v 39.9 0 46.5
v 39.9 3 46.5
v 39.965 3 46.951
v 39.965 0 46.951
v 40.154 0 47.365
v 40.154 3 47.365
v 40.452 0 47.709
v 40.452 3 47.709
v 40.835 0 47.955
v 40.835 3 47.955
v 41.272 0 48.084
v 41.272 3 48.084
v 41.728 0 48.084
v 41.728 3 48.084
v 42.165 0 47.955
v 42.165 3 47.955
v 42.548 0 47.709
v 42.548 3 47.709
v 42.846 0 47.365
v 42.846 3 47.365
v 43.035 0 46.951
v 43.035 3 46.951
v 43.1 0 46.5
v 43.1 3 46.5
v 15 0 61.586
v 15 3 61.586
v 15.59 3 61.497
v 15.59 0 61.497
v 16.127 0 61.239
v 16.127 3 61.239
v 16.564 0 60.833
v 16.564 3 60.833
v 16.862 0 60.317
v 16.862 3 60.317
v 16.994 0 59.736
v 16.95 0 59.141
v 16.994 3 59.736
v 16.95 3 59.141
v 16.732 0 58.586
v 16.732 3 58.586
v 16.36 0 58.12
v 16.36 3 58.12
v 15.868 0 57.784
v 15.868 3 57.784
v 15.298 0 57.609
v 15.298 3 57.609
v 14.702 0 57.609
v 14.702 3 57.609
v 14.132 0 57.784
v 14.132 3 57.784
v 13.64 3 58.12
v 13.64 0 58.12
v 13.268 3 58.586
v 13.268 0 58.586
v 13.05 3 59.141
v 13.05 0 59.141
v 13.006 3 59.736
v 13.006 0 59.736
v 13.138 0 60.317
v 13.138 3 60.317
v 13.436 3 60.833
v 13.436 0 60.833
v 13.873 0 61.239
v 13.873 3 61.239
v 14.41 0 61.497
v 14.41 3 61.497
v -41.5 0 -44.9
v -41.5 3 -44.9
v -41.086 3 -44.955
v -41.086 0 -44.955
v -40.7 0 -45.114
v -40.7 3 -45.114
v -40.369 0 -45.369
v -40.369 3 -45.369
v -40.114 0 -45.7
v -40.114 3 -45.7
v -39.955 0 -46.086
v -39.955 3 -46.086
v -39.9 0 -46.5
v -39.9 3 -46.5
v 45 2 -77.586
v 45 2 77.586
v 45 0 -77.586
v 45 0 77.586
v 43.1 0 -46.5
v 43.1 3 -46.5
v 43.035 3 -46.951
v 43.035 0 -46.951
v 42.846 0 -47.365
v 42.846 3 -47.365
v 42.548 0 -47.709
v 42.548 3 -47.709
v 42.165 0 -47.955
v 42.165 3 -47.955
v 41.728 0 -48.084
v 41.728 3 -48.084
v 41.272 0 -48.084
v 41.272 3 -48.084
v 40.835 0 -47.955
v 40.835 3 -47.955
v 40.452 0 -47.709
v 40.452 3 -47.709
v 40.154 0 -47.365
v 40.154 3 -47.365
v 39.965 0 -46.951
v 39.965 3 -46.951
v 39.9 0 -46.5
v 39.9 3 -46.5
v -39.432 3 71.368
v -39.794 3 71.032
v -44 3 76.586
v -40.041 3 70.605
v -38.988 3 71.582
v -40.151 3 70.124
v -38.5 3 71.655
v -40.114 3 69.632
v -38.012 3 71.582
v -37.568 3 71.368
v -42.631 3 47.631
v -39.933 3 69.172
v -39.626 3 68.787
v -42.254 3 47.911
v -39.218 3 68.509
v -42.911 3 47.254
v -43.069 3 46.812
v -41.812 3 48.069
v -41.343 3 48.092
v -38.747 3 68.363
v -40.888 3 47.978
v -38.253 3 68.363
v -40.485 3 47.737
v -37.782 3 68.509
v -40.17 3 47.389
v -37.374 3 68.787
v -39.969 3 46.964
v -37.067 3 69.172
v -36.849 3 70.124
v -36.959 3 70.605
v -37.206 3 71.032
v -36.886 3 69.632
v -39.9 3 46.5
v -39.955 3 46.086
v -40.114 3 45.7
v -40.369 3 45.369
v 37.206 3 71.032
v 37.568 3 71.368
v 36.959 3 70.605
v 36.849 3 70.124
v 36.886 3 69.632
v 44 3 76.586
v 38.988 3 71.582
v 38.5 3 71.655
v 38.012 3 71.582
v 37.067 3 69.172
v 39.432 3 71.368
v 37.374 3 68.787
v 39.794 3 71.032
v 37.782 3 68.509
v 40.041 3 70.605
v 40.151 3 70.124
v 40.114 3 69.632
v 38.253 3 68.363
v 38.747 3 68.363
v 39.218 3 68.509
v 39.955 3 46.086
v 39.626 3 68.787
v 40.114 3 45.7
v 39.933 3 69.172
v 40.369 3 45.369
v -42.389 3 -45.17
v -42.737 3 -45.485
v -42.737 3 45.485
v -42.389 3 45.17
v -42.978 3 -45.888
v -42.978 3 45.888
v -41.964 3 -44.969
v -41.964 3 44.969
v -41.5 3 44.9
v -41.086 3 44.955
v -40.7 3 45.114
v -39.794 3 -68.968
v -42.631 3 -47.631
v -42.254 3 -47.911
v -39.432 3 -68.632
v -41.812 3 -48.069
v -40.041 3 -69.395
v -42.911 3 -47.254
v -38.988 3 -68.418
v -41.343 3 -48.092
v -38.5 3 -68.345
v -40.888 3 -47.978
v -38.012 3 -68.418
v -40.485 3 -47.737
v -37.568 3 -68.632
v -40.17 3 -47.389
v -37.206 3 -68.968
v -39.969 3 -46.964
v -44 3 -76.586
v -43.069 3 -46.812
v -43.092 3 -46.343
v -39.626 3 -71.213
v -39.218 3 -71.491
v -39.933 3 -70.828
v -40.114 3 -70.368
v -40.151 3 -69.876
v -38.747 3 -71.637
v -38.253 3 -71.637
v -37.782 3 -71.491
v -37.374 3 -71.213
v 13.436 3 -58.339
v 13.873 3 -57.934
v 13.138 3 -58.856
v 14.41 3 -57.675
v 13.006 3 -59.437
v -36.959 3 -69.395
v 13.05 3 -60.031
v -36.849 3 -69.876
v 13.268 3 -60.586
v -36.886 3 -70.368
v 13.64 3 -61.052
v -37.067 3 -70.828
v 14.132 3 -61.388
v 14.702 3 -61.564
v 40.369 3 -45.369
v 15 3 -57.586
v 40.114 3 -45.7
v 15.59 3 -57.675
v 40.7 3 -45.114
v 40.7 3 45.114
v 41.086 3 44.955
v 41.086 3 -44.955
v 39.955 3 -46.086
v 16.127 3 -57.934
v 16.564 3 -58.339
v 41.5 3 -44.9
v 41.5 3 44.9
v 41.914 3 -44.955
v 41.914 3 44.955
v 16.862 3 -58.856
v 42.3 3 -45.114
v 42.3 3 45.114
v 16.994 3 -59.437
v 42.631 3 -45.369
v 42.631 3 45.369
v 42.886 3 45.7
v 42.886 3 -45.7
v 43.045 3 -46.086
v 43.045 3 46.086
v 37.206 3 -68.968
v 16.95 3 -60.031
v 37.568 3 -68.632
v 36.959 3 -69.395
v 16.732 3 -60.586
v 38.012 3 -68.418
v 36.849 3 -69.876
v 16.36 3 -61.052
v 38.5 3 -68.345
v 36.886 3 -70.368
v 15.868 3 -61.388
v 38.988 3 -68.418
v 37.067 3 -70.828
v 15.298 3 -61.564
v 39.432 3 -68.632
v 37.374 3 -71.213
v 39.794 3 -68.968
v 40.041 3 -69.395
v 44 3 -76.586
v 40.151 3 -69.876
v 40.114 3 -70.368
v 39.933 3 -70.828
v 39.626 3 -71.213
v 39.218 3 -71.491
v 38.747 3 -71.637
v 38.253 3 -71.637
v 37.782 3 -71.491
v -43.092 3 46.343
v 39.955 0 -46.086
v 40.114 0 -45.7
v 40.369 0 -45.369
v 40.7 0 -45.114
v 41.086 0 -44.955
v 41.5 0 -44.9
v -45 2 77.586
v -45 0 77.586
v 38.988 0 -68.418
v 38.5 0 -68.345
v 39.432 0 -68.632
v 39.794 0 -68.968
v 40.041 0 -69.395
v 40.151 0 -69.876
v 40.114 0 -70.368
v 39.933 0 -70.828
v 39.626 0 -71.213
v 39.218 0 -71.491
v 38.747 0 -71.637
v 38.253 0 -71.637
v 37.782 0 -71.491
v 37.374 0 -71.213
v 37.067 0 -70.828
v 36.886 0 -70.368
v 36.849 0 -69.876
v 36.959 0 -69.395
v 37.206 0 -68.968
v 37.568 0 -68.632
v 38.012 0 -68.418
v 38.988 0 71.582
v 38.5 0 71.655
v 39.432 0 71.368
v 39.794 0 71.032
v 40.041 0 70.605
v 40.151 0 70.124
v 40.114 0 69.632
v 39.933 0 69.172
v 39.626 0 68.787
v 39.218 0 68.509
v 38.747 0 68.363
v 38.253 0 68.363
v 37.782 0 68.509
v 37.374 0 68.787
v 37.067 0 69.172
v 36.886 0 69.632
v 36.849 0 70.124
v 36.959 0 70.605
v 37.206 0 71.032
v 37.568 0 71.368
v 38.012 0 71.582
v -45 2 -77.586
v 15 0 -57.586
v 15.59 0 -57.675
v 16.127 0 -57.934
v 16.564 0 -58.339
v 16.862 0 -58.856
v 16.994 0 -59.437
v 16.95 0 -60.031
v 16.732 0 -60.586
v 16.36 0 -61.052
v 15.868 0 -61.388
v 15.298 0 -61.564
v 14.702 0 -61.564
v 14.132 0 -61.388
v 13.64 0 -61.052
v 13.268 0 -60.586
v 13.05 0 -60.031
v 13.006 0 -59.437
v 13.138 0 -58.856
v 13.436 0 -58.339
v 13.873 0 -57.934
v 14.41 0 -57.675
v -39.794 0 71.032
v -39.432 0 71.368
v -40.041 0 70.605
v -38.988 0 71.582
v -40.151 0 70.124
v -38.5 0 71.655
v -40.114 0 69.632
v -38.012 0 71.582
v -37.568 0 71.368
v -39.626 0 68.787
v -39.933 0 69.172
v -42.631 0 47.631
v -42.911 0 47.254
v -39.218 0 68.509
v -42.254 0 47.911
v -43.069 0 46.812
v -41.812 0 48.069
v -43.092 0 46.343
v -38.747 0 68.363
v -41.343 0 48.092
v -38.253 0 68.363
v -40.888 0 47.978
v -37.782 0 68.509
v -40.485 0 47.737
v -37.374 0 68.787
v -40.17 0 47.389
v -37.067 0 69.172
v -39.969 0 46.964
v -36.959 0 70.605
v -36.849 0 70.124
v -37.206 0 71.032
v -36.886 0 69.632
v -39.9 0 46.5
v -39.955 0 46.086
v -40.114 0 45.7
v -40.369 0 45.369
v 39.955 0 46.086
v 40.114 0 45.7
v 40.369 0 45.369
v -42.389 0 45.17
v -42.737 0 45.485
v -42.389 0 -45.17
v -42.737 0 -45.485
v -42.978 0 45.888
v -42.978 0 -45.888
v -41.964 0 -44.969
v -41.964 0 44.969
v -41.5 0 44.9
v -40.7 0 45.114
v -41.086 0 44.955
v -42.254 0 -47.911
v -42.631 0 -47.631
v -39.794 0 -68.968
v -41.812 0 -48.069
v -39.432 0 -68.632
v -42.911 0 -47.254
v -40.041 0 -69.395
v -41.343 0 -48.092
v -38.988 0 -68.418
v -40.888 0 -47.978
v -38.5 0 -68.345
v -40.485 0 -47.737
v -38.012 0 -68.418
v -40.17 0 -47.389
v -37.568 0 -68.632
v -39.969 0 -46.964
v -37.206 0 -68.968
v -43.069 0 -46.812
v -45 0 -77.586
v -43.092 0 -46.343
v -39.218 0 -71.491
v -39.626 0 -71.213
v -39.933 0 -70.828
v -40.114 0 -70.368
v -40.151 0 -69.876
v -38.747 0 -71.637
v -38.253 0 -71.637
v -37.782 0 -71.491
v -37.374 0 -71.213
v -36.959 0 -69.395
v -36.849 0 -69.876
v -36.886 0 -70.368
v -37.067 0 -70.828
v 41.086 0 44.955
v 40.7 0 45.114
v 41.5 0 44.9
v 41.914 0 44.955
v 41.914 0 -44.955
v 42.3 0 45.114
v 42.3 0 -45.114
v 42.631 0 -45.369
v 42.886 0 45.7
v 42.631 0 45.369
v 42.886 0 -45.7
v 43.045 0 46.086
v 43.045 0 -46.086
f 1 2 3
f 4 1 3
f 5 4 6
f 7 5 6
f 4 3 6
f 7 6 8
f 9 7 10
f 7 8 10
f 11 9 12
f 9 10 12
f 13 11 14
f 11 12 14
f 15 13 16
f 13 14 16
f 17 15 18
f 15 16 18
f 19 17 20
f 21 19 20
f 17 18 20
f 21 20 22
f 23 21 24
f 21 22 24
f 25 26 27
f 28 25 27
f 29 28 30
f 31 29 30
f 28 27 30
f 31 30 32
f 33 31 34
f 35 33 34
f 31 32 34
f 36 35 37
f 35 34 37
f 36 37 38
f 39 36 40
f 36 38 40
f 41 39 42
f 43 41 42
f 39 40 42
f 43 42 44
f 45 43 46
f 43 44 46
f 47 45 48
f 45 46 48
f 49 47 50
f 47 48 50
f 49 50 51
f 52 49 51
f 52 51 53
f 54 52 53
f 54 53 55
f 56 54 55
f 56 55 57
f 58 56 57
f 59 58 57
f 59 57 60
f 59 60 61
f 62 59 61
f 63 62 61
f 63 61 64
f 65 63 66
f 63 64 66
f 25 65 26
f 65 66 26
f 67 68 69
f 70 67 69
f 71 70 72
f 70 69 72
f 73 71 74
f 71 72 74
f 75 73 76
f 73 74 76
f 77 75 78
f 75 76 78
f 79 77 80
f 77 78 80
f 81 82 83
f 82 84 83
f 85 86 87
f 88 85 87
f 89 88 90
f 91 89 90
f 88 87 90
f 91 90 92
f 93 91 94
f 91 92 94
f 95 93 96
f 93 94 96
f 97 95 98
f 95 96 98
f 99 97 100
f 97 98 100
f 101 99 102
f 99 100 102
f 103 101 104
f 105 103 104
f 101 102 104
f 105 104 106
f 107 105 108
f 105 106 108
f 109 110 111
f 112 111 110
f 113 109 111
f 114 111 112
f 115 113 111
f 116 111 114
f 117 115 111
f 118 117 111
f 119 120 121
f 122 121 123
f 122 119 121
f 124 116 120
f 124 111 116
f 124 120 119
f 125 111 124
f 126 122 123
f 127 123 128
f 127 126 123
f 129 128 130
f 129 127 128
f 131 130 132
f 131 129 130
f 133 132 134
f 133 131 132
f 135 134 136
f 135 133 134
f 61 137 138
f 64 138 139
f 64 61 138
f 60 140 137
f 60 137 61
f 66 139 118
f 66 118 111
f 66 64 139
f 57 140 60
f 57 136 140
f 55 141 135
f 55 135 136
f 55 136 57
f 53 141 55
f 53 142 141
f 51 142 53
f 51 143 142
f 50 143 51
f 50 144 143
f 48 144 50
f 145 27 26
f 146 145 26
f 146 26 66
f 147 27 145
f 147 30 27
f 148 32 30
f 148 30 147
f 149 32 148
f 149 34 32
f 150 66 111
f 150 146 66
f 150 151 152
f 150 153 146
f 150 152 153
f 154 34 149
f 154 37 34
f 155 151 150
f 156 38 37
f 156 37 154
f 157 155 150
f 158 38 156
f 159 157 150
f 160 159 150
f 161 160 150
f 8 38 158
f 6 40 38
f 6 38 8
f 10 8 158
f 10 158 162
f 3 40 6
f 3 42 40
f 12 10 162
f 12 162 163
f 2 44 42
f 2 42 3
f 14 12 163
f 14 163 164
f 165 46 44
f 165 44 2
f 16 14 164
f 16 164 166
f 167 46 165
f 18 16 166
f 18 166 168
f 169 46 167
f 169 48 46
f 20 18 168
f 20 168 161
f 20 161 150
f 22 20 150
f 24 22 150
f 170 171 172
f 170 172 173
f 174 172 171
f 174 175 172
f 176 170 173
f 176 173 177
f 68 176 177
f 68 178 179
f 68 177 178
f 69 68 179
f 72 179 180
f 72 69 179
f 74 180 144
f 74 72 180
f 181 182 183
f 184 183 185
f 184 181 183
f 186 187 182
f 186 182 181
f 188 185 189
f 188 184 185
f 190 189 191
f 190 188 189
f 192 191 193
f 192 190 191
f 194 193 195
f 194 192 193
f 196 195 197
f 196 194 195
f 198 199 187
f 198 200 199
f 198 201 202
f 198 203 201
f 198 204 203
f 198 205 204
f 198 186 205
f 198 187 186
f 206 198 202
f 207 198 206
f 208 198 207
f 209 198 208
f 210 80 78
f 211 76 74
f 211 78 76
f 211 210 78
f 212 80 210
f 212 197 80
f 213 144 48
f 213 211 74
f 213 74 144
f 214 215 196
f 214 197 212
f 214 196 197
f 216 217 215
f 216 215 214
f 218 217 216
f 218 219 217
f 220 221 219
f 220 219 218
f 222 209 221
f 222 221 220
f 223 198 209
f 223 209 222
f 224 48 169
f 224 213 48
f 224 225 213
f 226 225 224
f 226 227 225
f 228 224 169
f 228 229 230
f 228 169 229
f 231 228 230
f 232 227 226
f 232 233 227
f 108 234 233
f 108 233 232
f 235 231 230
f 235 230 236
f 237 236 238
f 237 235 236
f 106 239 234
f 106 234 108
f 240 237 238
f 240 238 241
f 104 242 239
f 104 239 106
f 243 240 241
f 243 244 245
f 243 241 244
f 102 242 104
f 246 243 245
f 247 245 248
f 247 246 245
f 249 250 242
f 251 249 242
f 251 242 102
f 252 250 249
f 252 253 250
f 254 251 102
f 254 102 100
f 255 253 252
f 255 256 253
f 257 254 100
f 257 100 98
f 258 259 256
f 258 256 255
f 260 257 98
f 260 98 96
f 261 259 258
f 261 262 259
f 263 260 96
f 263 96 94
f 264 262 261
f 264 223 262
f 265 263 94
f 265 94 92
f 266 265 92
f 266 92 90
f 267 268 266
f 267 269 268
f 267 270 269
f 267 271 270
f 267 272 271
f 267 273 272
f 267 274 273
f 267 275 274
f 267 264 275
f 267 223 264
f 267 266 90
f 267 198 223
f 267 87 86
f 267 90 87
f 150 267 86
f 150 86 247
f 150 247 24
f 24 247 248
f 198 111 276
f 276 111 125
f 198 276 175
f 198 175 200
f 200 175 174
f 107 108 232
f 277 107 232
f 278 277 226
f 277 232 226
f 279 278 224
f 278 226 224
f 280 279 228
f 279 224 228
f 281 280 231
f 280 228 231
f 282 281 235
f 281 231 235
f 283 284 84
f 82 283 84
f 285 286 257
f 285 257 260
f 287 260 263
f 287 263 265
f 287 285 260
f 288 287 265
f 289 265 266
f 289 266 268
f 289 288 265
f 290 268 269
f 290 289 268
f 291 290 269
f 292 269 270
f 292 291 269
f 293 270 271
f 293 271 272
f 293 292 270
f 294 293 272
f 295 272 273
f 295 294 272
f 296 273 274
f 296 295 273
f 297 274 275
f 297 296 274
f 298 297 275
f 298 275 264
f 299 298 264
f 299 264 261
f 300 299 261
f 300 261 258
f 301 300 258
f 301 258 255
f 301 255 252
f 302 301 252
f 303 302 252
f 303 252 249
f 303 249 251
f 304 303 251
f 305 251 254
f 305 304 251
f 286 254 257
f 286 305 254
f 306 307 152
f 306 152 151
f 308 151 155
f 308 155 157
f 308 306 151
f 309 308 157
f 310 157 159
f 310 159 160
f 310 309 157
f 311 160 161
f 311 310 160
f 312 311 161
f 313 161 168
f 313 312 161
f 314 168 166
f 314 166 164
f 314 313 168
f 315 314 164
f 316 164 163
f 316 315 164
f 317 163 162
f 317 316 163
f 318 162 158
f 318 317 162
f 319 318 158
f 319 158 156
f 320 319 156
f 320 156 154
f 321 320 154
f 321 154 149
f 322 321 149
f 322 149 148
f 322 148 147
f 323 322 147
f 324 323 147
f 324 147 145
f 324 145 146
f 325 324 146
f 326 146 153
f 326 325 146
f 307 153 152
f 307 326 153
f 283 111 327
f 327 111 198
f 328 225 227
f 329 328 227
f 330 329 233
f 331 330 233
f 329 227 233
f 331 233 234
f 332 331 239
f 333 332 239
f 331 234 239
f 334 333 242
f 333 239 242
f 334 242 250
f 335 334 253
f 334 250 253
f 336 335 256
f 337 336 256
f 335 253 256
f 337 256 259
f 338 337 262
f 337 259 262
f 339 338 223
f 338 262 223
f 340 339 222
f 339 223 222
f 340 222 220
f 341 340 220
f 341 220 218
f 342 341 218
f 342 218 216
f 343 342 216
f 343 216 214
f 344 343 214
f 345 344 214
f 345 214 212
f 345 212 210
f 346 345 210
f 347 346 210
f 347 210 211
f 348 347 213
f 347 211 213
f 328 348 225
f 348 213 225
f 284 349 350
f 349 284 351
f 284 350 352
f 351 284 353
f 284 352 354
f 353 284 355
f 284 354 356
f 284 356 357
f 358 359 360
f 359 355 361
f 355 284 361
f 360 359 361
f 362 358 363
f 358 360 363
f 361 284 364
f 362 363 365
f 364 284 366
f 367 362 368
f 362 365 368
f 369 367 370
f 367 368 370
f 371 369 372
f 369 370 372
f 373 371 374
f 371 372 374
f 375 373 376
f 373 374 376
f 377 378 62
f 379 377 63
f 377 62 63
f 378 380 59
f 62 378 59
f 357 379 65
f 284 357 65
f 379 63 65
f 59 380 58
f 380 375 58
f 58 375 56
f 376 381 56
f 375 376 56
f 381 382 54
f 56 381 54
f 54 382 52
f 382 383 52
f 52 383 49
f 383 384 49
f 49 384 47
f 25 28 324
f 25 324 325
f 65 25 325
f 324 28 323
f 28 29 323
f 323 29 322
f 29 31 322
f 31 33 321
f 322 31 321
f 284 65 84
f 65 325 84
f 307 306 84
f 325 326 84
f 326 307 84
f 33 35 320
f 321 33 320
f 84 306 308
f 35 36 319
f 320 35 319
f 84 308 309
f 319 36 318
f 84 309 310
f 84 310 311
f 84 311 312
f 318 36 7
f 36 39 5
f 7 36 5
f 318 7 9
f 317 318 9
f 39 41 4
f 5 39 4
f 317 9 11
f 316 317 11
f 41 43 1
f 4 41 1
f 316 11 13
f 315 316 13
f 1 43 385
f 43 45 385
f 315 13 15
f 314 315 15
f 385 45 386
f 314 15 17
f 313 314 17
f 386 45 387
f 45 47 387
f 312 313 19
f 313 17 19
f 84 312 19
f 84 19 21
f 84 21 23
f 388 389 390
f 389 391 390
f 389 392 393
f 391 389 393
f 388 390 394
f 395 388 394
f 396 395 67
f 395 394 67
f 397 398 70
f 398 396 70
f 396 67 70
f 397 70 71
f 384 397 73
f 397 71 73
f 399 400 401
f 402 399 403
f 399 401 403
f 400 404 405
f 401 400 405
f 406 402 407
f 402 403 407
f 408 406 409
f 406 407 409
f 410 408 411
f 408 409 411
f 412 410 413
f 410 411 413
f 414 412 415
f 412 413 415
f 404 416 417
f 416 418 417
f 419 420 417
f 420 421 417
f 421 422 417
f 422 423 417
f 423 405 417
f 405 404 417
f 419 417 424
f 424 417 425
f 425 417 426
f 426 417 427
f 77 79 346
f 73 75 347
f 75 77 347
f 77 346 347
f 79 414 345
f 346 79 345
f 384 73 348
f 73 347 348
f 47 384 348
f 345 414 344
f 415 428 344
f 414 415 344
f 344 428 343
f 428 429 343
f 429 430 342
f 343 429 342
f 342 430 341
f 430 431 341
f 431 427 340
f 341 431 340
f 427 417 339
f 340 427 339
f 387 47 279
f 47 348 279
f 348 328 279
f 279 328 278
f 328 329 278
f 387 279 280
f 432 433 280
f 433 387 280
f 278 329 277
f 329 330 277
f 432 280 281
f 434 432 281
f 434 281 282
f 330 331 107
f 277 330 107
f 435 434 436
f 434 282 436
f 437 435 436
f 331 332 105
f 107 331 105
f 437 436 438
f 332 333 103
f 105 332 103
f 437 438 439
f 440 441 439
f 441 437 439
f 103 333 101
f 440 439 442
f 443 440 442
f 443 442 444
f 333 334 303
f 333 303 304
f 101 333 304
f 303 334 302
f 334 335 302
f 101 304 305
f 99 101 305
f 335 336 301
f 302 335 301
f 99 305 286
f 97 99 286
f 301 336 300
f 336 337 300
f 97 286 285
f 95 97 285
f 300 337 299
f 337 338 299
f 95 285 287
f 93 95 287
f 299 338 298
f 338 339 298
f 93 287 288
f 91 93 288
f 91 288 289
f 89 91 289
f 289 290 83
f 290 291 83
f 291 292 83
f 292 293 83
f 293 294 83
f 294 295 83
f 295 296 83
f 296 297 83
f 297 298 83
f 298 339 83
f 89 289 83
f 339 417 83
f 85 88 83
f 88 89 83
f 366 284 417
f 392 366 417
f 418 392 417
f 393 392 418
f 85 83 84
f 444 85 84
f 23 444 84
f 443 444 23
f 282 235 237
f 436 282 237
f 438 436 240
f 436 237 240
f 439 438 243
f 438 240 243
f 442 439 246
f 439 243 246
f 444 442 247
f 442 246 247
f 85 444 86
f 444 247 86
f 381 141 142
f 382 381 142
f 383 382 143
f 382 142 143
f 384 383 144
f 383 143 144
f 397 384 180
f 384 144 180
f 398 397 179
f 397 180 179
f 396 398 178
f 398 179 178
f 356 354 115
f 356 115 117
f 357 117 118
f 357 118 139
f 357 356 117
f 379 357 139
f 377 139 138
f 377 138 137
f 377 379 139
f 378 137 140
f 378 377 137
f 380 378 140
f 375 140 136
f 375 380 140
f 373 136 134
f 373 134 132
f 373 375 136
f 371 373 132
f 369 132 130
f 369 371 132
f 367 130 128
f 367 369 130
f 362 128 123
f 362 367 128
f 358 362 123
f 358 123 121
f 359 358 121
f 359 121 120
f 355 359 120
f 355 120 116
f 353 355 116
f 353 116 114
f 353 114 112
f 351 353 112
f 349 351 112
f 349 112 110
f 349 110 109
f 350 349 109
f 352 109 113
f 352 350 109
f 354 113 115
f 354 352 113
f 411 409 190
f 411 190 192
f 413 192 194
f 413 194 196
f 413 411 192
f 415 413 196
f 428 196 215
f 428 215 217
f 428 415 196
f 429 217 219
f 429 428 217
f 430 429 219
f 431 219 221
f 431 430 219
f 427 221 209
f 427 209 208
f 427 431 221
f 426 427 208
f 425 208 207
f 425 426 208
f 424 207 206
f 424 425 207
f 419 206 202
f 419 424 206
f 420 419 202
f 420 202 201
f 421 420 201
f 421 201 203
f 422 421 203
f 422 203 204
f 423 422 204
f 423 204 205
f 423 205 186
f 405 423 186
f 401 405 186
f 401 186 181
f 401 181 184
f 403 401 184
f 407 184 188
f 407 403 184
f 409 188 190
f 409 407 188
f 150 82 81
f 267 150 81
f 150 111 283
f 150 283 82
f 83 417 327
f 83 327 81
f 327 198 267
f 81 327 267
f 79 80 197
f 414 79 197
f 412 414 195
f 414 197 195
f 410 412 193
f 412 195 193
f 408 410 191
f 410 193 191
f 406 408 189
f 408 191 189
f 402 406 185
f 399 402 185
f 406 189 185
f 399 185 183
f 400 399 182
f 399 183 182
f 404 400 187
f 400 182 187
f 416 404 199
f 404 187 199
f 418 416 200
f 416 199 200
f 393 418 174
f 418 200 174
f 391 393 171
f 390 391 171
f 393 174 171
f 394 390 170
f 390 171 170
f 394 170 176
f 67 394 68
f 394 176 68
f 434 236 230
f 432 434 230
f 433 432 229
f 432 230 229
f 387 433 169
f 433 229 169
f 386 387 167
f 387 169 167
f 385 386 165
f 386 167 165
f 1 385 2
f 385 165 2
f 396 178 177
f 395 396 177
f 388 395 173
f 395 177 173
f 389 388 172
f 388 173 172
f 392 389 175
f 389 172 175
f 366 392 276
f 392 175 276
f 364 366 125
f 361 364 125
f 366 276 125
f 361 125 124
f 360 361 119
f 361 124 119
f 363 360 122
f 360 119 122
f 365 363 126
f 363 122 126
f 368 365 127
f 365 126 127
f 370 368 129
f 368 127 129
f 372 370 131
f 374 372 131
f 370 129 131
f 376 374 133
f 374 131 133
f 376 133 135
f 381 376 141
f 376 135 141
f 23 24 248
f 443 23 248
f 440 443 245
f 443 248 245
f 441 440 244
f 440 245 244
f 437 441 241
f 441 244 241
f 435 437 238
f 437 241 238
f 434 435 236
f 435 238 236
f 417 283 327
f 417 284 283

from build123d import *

# Parameters (mm, degrees)
SKETCH1_W           = 90
SKETCH1_H           = 155.172413794
SKETCH1_R           = 1.655172414
BOSS_EXTRUDE1_DEPTH = 3
CUT_EXTRUDE1_DEPTH  = 90.741960646
CHAMFER1_SIZE       = 1
CHAMFER2_SIZE       = 1
SKETCH6_R           = 2
CUT_EXTRUDE2_DEPTH  = 3


with BuildPart() as part:
    # Sketch1 → Boss-Extrude1 (new body)
    with BuildSketch(Plane(origin=(0, 0, 0), x_dir=(1, 0, 0), z_dir=(0, 1, 0))):
        Rectangle(SKETCH1_W, SKETCH1_H)
        with Locations(Location((38.5, -70, 0), (0, 0, 270))):
            Circle(SKETCH1_R, mode=Mode.SUBTRACT)
        with Locations(Location((-38.5, -70, 0), (0, 0, 270))):
            Circle(SKETCH1_R, mode=Mode.SUBTRACT)
        with Locations(Location((38.5, 70, 0), (0, 0, 270))):
            Circle(SKETCH1_R, mode=Mode.SUBTRACT)
        with Locations(Location((-38.5, 70, 0), (0, 0, 270))):
            Circle(SKETCH1_R, mode=Mode.SUBTRACT)
    extrude(amount=BOSS_EXTRUDE1_DEPTH)

    # Sketch2 → Cut-Extrude1 (cut, through all)
    with BuildSketch(Plane(origin=(0, 3, 0), x_dir=(1, 0, 0), z_dir=(0, 1, 0))):
        with BuildLine():
            ThreePointArc((-39.9, 46.5), (-42.63137085, 47.63137085), (-41.5, 44.9))
            Line((-41.5, 44.9), (-41.5, 46.5))
            Line((-41.5, 46.5), (-39.9, 46.5))
        make_face()
        with BuildLine():
            Line((-41.5, 46.5), (-41.5, 44.9))
            ThreePointArc((-41.5, 44.9), (-40.36862915, 45.36862915), (-39.9, 46.5))
            Line((-39.9, 46.5), (-41.5, 46.5))
        make_face()
        with BuildLine():
            ThreePointArc((39.9, 46.5), (40.36862915, 45.36862915), (41.5, 44.9))
            Line((41.5, 44.9), (41.5, 46.5))
            Line((41.5, 46.5), (39.9, 46.5))
        make_face()
        with BuildLine():
            Line((41.5, 46.5), (41.5, 44.9))
            ThreePointArc((41.5, 44.9), (42.63137085, 45.36862915), (43.1, 46.5))
            ThreePointArc((43.1, 46.5), (41.5, 48.1), (39.9, 46.5))
            Line((39.9, 46.5), (41.5, 46.5))
        make_face()
        with BuildLine():
            ThreePointArc((41.5, -44.9), (40.36862915, -45.36862915), (39.9, -46.5))
            Line((39.9, -46.5), (41.5, -46.5))
            Line((41.5, -46.5), (41.5, -44.9))
        make_face()
        with BuildLine():
            Line((41.5, -46.5), (39.9, -46.5))
            ThreePointArc((39.9, -46.5), (41.5, -48.1), (43.1, -46.5))
            ThreePointArc((43.1, -46.5), (42.63137085, -45.36862915), (41.5, -44.9))
            Line((41.5, -44.9), (41.5, -46.5))
        make_face()
        with BuildLine():
            Line((-41.5, -44.9), (-41.5, -46.5))
            Line((-41.5, -46.5), (-39.9, -46.5))
            ThreePointArc((-39.9, -46.5), (-40.36862915, -45.36862915), (-41.5, -44.9))
        make_face()
        with BuildLine():
            Line((-39.9, -46.5), (-41.5, -46.5))
            Line((-41.5, -46.5), (-41.5, -44.9))
            ThreePointArc((-41.5, -44.9), (-42.63137085, -47.63137085), (-39.9, -46.5))
        make_face()
    extrude(amount=-CUT_EXTRUDE1_DEPTH, mode=Mode.SUBTRACT)

    # Chamfer1
    chamfer1_edges = [part.edges().sort_by_distance(p)[0] for p in [
        (0, 3, 77.586206897),
        (0, 3, -77.586206897),
    ]]
    chamfer(chamfer1_edges, length=CHAMFER1_SIZE)

    # Chamfer2
    chamfer2_edges = [part.edges().sort_by_distance(p)[0] for p in [
        (45, 3, 0),
        (-45, 3, 0),
    ]]
    chamfer(chamfer2_edges, length=CHAMFER2_SIZE)

    # Sketch6 → Cut-Extrude2 (cut)
    with BuildSketch(Plane(origin=(0, 3, 0), x_dir=(1, 0, 0), z_dir=(0, 1, 0))):
        with Locations(Location((15, -59.586206897, 0), (0, 0, 270))):
            Circle(SKETCH6_R)
        with Locations(Location((15, 59.586206897, 0), (0, 0, 270))):
            Circle(SKETCH6_R)
    extrude(amount=-CUT_EXTRUDE2_DEPTH, mode=Mode.SUBTRACT)


solid = part.part
